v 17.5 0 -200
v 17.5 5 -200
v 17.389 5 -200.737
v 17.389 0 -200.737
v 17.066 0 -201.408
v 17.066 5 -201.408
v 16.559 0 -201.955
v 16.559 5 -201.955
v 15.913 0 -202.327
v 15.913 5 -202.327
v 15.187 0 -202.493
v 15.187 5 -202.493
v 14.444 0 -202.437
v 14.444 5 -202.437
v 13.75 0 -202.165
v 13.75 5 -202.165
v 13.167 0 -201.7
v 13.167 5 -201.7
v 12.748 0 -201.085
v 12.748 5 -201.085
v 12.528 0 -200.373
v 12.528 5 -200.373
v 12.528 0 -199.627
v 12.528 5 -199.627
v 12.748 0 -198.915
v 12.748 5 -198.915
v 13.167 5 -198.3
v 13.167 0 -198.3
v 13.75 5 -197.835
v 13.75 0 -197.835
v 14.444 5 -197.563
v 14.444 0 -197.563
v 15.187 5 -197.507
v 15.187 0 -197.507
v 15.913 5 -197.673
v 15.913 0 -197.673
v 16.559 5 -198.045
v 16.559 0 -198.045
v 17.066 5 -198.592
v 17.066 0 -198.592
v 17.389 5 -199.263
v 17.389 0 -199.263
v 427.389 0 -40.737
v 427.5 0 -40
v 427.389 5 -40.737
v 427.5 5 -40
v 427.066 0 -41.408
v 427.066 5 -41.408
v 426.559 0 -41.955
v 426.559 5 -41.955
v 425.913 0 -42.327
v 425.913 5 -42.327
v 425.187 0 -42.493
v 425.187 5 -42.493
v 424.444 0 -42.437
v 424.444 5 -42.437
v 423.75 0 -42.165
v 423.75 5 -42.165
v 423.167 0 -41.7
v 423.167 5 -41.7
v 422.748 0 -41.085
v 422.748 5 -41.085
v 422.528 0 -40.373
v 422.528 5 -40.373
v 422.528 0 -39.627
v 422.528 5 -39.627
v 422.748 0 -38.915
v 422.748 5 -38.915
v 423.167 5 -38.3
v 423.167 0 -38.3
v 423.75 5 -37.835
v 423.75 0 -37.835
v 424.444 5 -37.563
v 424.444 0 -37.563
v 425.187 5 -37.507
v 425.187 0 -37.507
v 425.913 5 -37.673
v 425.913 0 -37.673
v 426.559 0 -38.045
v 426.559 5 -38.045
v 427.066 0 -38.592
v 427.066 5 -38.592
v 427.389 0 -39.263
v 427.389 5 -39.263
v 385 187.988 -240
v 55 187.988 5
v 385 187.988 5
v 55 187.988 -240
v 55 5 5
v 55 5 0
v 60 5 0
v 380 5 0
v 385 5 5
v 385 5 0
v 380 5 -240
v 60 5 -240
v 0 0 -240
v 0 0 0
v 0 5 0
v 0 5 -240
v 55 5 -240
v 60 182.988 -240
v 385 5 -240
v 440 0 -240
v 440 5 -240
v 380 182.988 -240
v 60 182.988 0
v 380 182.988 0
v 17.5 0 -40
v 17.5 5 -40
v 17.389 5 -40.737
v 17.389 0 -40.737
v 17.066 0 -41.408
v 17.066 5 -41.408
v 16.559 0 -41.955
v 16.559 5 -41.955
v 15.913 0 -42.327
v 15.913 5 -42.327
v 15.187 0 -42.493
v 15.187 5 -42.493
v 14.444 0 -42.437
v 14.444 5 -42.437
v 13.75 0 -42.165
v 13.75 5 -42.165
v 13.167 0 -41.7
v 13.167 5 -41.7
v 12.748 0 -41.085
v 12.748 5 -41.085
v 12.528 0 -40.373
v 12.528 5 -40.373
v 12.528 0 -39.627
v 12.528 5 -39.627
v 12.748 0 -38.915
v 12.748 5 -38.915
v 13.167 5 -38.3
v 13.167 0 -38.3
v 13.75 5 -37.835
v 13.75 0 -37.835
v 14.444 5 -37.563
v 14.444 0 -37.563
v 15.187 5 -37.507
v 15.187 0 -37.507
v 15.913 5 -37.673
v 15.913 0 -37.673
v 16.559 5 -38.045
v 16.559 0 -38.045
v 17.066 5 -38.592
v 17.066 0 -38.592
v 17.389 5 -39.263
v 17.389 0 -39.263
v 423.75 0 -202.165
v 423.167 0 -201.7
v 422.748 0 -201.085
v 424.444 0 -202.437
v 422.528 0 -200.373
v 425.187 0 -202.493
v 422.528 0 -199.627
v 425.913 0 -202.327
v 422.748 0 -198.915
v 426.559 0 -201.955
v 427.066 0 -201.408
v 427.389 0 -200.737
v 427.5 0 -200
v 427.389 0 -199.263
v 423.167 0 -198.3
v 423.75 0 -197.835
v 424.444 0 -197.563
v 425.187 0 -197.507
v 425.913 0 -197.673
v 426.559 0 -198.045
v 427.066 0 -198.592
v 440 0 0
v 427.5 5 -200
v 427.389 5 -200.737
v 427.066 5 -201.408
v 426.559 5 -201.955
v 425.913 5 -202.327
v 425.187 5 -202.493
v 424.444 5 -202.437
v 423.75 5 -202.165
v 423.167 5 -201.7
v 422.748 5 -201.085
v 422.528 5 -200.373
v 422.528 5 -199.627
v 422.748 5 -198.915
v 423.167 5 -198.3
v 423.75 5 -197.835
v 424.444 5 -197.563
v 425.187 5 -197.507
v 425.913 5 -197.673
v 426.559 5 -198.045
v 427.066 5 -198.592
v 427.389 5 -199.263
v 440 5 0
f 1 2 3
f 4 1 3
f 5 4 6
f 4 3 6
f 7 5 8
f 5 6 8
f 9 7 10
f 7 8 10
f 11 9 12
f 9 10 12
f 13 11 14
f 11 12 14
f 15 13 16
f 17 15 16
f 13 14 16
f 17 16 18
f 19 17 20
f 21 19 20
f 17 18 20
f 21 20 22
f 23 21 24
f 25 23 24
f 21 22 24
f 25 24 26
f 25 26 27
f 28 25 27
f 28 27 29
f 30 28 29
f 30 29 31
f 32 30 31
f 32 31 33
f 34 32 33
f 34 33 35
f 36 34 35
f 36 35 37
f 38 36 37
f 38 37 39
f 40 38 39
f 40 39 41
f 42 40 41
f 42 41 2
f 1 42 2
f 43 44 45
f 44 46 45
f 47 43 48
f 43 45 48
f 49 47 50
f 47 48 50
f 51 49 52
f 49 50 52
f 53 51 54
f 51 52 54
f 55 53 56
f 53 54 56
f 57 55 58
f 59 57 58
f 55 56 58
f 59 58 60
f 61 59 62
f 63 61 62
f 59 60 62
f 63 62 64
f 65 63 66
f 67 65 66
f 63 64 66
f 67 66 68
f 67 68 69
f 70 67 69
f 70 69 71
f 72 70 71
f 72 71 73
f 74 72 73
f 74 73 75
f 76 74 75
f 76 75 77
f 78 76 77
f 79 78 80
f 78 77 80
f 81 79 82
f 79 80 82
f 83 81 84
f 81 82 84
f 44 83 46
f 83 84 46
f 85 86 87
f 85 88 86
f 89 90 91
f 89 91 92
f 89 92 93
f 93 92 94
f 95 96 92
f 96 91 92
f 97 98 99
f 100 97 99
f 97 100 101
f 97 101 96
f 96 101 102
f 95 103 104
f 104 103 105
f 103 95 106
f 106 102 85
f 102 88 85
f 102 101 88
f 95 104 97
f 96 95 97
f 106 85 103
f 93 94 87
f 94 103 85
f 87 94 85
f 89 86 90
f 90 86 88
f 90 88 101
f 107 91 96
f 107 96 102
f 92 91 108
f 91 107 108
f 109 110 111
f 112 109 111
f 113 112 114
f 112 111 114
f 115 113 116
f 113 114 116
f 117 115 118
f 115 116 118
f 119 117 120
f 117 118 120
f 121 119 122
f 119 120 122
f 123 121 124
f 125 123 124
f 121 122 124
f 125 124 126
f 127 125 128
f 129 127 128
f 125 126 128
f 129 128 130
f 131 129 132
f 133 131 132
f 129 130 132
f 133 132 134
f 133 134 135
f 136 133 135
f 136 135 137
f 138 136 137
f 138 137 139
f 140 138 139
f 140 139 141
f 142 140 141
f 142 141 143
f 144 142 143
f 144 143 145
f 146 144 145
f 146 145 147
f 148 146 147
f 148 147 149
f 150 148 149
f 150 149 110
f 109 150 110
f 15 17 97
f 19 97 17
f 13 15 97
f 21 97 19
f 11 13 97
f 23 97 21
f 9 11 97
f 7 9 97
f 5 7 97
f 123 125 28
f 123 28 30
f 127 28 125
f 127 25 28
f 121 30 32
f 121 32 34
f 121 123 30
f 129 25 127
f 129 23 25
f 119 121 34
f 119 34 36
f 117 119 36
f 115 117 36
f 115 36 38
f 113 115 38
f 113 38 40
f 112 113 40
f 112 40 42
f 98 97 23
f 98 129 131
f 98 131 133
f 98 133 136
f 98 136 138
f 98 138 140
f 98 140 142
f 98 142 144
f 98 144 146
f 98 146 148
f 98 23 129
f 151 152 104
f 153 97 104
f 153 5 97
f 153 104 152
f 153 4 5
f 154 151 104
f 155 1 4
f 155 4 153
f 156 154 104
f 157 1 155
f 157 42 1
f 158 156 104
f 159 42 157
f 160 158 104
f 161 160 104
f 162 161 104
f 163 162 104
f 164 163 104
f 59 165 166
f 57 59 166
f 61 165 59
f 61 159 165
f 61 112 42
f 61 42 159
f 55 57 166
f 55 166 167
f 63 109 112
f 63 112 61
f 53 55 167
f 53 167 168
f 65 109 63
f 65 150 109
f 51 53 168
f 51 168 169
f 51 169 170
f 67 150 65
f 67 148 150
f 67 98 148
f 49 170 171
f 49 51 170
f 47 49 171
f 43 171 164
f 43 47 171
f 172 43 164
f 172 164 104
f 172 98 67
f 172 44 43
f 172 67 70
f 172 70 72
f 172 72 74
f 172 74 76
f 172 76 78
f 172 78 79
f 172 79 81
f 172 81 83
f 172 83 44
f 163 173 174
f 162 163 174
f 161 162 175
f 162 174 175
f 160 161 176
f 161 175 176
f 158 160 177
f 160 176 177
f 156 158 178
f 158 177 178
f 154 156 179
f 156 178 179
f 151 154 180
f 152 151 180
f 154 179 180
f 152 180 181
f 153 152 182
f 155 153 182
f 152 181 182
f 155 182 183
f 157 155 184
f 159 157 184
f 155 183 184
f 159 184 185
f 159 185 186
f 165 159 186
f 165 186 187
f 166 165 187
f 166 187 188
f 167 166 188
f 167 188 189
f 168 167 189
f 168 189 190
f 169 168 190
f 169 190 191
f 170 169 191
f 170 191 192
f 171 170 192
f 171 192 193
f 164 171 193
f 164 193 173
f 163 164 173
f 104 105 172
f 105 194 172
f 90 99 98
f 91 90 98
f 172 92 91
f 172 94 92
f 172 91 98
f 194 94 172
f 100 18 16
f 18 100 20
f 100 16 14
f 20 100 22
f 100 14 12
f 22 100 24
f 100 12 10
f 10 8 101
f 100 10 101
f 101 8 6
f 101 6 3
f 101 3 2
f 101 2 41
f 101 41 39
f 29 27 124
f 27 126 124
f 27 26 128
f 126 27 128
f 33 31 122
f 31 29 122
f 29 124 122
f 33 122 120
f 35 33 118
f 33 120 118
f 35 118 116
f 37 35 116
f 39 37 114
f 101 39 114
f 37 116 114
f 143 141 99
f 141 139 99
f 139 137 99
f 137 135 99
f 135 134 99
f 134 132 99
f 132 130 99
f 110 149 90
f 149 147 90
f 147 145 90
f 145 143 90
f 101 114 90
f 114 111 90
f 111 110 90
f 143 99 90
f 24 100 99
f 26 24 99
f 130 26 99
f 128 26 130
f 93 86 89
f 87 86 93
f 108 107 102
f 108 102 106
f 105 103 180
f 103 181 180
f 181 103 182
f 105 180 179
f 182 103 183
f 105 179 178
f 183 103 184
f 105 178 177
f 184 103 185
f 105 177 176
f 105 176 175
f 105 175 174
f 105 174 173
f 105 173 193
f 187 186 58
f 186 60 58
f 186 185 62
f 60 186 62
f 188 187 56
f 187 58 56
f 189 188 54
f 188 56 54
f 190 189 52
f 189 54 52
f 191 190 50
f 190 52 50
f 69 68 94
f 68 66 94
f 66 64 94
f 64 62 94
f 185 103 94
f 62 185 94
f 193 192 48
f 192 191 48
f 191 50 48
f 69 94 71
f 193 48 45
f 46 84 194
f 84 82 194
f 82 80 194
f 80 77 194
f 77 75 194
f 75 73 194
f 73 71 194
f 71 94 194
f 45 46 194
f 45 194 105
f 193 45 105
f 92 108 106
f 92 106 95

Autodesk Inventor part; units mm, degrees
ref_plane "YZ Plane" through (0, 0, 0) normal (1, 0, 0) x (0, 1, 0)
ref_plane "XZ Plane" through (0, 0, 0) normal (0, 1, 0) x (-1, 0, 0)
ref_plane "XY Plane" through (0, 0, 0) normal (0, 0, 1) x (1, 0, 0)
sketch "Sketch1" plane through (0, 0, 0) normal (0, 0, 1) x (1, 0, 0)
  line L0 (0, 0) -> (440, 0)
  line L1 (220, 0) -> (380, 0)
  line L2 (220, 0) -> (60, 0)
  line L3 (60, 2.9881) -> (60, 182.9881)
  line L4 (60, 182.9881) -> (380, 182.9881)
  line L5 (380, 182.9881) -> (380, 0)
  line L6 (60, -5) -> (220, -5)
  line L7 (220, -5) -> (385, -5)
  line L8 (385, -5) -> (385, 187.9881)
  line L9 (385, 187.9881) -> (55, 187.9881)
  line L10 (55, 187.9881) -> (55, 2.9881)
  line L11 (0, 0) -> (0, 5)
  line L12 (0, 5) -> (440, 5)
  line L13 (440, 5) -> (440, 0)
  point P0 (385, 5)
  point P1 (55, 5)
  point P2 (380, 5)
  point P3 (60, 5)
  dimension "d0" = 440
  dimension "d1" = 160
  dimension "d2" = 160
  dimension "d3" = 180
  dimension "d4" = 5
  dimension "d5" = 5
extrude "Extrusion1" add sketch "Sketch1" against normal blind 240 contours L11 L12 L5 L0 | L10 L9 L8 L12 L5 L4 L3 | L5 L12 L8 L0 | L8 L12 L13 L0
sketch "Sketch2" plane through (0, 5, 0) normal (0, 1, 0) x (1, 0, 0)
  line L0 (0, 0) -> (0, 240) projected
  line L1 (0, 240) -> (15, 240)
  line L2 (440, 240) -> (0, 240) projected
  line L3 (15, 240) -> (15, -108.1496)
  line L4 (440, 240) -> (425, 240)
  line L5 (425, 240) -> (425, -108.1496)
  circle A0 centre (15, 200) radius 2.5
  circle A1 centre (15, 40) radius 2.5
  line L6 (55, 0) -> (0, 0) projected
  line L7 (220, 240) -> (220, -68.5309)
  circle A2 centre (425, 200) radius 2.5
  circle A3 centre (425, 40) radius 2.5
  dimension "d8" = 15
  dimension "d9" = 15
  dimension "d10" = 5
  dimension "d11" = 5
  dimension "d12" = 40
  dimension "d13" = 40
extrude "Extrusion2" cut sketch "Sketch2" against normal blind 215 contours A3 L5 | L5 A3 | A2 L5 | L5 A2 | A1 L3 | L3 A1 | A0 L3 | L3 A0
sketch "Sketch3" plane through (0, 0, 0) normal (0, 0, 1) x (1, 0, 0)
  line L0 (0, 5) -> (55, 5) projected
  line L1 (55, 187.9881) -> (385, 187.9881) projected
  line L2 (55, 5) -> (385, 5)
  line L3 (385, 5) -> (385, 187.9881)
  line L4 (385, 187.9881) -> (55, 187.9881)
  line L5 (55, 187.9881) -> (55, 5)
  point P0 (60, 5)
  point P1 (380, 182.9881)
extrude "Extrusion3" add sketch "Sketch3" along normal blind 5
properties part number "Proteção de acrilico-Painel de controle"
